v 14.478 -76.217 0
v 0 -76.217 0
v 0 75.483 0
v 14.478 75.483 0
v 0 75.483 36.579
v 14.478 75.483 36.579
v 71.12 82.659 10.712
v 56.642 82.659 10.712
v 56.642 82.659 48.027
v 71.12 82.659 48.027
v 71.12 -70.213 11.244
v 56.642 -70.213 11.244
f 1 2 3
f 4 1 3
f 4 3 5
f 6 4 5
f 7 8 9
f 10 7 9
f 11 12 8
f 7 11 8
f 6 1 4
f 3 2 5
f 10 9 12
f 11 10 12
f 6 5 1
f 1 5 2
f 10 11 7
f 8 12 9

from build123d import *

# Parameters (mm, degrees)
F3_DEPTH = 14.478


with BuildPart() as f3:
    # F2 (on offset) → F3 (new body)
    with BuildSketch(Plane.YZ.offset(56.642)):
        Polygon((82.658521831, 48.0265729129), (-70.2127218246, 11.2437400967), (82.658521831, 10.7124280185), align=None)
    extrude(amount=F3_DEPTH)


with BuildPart() as f3b:
    # F0 (on Right) → F3, piece 2 (new body)
    with BuildSketch(Plane.YZ):
        Polygon((75.4834413528, 36.5794971585), (-76.2174800038, 0), (75.4834413528, 0), align=None)
    extrude(amount=F3_DEPTH)


solid = Compound([f3.part, f3b.part])
